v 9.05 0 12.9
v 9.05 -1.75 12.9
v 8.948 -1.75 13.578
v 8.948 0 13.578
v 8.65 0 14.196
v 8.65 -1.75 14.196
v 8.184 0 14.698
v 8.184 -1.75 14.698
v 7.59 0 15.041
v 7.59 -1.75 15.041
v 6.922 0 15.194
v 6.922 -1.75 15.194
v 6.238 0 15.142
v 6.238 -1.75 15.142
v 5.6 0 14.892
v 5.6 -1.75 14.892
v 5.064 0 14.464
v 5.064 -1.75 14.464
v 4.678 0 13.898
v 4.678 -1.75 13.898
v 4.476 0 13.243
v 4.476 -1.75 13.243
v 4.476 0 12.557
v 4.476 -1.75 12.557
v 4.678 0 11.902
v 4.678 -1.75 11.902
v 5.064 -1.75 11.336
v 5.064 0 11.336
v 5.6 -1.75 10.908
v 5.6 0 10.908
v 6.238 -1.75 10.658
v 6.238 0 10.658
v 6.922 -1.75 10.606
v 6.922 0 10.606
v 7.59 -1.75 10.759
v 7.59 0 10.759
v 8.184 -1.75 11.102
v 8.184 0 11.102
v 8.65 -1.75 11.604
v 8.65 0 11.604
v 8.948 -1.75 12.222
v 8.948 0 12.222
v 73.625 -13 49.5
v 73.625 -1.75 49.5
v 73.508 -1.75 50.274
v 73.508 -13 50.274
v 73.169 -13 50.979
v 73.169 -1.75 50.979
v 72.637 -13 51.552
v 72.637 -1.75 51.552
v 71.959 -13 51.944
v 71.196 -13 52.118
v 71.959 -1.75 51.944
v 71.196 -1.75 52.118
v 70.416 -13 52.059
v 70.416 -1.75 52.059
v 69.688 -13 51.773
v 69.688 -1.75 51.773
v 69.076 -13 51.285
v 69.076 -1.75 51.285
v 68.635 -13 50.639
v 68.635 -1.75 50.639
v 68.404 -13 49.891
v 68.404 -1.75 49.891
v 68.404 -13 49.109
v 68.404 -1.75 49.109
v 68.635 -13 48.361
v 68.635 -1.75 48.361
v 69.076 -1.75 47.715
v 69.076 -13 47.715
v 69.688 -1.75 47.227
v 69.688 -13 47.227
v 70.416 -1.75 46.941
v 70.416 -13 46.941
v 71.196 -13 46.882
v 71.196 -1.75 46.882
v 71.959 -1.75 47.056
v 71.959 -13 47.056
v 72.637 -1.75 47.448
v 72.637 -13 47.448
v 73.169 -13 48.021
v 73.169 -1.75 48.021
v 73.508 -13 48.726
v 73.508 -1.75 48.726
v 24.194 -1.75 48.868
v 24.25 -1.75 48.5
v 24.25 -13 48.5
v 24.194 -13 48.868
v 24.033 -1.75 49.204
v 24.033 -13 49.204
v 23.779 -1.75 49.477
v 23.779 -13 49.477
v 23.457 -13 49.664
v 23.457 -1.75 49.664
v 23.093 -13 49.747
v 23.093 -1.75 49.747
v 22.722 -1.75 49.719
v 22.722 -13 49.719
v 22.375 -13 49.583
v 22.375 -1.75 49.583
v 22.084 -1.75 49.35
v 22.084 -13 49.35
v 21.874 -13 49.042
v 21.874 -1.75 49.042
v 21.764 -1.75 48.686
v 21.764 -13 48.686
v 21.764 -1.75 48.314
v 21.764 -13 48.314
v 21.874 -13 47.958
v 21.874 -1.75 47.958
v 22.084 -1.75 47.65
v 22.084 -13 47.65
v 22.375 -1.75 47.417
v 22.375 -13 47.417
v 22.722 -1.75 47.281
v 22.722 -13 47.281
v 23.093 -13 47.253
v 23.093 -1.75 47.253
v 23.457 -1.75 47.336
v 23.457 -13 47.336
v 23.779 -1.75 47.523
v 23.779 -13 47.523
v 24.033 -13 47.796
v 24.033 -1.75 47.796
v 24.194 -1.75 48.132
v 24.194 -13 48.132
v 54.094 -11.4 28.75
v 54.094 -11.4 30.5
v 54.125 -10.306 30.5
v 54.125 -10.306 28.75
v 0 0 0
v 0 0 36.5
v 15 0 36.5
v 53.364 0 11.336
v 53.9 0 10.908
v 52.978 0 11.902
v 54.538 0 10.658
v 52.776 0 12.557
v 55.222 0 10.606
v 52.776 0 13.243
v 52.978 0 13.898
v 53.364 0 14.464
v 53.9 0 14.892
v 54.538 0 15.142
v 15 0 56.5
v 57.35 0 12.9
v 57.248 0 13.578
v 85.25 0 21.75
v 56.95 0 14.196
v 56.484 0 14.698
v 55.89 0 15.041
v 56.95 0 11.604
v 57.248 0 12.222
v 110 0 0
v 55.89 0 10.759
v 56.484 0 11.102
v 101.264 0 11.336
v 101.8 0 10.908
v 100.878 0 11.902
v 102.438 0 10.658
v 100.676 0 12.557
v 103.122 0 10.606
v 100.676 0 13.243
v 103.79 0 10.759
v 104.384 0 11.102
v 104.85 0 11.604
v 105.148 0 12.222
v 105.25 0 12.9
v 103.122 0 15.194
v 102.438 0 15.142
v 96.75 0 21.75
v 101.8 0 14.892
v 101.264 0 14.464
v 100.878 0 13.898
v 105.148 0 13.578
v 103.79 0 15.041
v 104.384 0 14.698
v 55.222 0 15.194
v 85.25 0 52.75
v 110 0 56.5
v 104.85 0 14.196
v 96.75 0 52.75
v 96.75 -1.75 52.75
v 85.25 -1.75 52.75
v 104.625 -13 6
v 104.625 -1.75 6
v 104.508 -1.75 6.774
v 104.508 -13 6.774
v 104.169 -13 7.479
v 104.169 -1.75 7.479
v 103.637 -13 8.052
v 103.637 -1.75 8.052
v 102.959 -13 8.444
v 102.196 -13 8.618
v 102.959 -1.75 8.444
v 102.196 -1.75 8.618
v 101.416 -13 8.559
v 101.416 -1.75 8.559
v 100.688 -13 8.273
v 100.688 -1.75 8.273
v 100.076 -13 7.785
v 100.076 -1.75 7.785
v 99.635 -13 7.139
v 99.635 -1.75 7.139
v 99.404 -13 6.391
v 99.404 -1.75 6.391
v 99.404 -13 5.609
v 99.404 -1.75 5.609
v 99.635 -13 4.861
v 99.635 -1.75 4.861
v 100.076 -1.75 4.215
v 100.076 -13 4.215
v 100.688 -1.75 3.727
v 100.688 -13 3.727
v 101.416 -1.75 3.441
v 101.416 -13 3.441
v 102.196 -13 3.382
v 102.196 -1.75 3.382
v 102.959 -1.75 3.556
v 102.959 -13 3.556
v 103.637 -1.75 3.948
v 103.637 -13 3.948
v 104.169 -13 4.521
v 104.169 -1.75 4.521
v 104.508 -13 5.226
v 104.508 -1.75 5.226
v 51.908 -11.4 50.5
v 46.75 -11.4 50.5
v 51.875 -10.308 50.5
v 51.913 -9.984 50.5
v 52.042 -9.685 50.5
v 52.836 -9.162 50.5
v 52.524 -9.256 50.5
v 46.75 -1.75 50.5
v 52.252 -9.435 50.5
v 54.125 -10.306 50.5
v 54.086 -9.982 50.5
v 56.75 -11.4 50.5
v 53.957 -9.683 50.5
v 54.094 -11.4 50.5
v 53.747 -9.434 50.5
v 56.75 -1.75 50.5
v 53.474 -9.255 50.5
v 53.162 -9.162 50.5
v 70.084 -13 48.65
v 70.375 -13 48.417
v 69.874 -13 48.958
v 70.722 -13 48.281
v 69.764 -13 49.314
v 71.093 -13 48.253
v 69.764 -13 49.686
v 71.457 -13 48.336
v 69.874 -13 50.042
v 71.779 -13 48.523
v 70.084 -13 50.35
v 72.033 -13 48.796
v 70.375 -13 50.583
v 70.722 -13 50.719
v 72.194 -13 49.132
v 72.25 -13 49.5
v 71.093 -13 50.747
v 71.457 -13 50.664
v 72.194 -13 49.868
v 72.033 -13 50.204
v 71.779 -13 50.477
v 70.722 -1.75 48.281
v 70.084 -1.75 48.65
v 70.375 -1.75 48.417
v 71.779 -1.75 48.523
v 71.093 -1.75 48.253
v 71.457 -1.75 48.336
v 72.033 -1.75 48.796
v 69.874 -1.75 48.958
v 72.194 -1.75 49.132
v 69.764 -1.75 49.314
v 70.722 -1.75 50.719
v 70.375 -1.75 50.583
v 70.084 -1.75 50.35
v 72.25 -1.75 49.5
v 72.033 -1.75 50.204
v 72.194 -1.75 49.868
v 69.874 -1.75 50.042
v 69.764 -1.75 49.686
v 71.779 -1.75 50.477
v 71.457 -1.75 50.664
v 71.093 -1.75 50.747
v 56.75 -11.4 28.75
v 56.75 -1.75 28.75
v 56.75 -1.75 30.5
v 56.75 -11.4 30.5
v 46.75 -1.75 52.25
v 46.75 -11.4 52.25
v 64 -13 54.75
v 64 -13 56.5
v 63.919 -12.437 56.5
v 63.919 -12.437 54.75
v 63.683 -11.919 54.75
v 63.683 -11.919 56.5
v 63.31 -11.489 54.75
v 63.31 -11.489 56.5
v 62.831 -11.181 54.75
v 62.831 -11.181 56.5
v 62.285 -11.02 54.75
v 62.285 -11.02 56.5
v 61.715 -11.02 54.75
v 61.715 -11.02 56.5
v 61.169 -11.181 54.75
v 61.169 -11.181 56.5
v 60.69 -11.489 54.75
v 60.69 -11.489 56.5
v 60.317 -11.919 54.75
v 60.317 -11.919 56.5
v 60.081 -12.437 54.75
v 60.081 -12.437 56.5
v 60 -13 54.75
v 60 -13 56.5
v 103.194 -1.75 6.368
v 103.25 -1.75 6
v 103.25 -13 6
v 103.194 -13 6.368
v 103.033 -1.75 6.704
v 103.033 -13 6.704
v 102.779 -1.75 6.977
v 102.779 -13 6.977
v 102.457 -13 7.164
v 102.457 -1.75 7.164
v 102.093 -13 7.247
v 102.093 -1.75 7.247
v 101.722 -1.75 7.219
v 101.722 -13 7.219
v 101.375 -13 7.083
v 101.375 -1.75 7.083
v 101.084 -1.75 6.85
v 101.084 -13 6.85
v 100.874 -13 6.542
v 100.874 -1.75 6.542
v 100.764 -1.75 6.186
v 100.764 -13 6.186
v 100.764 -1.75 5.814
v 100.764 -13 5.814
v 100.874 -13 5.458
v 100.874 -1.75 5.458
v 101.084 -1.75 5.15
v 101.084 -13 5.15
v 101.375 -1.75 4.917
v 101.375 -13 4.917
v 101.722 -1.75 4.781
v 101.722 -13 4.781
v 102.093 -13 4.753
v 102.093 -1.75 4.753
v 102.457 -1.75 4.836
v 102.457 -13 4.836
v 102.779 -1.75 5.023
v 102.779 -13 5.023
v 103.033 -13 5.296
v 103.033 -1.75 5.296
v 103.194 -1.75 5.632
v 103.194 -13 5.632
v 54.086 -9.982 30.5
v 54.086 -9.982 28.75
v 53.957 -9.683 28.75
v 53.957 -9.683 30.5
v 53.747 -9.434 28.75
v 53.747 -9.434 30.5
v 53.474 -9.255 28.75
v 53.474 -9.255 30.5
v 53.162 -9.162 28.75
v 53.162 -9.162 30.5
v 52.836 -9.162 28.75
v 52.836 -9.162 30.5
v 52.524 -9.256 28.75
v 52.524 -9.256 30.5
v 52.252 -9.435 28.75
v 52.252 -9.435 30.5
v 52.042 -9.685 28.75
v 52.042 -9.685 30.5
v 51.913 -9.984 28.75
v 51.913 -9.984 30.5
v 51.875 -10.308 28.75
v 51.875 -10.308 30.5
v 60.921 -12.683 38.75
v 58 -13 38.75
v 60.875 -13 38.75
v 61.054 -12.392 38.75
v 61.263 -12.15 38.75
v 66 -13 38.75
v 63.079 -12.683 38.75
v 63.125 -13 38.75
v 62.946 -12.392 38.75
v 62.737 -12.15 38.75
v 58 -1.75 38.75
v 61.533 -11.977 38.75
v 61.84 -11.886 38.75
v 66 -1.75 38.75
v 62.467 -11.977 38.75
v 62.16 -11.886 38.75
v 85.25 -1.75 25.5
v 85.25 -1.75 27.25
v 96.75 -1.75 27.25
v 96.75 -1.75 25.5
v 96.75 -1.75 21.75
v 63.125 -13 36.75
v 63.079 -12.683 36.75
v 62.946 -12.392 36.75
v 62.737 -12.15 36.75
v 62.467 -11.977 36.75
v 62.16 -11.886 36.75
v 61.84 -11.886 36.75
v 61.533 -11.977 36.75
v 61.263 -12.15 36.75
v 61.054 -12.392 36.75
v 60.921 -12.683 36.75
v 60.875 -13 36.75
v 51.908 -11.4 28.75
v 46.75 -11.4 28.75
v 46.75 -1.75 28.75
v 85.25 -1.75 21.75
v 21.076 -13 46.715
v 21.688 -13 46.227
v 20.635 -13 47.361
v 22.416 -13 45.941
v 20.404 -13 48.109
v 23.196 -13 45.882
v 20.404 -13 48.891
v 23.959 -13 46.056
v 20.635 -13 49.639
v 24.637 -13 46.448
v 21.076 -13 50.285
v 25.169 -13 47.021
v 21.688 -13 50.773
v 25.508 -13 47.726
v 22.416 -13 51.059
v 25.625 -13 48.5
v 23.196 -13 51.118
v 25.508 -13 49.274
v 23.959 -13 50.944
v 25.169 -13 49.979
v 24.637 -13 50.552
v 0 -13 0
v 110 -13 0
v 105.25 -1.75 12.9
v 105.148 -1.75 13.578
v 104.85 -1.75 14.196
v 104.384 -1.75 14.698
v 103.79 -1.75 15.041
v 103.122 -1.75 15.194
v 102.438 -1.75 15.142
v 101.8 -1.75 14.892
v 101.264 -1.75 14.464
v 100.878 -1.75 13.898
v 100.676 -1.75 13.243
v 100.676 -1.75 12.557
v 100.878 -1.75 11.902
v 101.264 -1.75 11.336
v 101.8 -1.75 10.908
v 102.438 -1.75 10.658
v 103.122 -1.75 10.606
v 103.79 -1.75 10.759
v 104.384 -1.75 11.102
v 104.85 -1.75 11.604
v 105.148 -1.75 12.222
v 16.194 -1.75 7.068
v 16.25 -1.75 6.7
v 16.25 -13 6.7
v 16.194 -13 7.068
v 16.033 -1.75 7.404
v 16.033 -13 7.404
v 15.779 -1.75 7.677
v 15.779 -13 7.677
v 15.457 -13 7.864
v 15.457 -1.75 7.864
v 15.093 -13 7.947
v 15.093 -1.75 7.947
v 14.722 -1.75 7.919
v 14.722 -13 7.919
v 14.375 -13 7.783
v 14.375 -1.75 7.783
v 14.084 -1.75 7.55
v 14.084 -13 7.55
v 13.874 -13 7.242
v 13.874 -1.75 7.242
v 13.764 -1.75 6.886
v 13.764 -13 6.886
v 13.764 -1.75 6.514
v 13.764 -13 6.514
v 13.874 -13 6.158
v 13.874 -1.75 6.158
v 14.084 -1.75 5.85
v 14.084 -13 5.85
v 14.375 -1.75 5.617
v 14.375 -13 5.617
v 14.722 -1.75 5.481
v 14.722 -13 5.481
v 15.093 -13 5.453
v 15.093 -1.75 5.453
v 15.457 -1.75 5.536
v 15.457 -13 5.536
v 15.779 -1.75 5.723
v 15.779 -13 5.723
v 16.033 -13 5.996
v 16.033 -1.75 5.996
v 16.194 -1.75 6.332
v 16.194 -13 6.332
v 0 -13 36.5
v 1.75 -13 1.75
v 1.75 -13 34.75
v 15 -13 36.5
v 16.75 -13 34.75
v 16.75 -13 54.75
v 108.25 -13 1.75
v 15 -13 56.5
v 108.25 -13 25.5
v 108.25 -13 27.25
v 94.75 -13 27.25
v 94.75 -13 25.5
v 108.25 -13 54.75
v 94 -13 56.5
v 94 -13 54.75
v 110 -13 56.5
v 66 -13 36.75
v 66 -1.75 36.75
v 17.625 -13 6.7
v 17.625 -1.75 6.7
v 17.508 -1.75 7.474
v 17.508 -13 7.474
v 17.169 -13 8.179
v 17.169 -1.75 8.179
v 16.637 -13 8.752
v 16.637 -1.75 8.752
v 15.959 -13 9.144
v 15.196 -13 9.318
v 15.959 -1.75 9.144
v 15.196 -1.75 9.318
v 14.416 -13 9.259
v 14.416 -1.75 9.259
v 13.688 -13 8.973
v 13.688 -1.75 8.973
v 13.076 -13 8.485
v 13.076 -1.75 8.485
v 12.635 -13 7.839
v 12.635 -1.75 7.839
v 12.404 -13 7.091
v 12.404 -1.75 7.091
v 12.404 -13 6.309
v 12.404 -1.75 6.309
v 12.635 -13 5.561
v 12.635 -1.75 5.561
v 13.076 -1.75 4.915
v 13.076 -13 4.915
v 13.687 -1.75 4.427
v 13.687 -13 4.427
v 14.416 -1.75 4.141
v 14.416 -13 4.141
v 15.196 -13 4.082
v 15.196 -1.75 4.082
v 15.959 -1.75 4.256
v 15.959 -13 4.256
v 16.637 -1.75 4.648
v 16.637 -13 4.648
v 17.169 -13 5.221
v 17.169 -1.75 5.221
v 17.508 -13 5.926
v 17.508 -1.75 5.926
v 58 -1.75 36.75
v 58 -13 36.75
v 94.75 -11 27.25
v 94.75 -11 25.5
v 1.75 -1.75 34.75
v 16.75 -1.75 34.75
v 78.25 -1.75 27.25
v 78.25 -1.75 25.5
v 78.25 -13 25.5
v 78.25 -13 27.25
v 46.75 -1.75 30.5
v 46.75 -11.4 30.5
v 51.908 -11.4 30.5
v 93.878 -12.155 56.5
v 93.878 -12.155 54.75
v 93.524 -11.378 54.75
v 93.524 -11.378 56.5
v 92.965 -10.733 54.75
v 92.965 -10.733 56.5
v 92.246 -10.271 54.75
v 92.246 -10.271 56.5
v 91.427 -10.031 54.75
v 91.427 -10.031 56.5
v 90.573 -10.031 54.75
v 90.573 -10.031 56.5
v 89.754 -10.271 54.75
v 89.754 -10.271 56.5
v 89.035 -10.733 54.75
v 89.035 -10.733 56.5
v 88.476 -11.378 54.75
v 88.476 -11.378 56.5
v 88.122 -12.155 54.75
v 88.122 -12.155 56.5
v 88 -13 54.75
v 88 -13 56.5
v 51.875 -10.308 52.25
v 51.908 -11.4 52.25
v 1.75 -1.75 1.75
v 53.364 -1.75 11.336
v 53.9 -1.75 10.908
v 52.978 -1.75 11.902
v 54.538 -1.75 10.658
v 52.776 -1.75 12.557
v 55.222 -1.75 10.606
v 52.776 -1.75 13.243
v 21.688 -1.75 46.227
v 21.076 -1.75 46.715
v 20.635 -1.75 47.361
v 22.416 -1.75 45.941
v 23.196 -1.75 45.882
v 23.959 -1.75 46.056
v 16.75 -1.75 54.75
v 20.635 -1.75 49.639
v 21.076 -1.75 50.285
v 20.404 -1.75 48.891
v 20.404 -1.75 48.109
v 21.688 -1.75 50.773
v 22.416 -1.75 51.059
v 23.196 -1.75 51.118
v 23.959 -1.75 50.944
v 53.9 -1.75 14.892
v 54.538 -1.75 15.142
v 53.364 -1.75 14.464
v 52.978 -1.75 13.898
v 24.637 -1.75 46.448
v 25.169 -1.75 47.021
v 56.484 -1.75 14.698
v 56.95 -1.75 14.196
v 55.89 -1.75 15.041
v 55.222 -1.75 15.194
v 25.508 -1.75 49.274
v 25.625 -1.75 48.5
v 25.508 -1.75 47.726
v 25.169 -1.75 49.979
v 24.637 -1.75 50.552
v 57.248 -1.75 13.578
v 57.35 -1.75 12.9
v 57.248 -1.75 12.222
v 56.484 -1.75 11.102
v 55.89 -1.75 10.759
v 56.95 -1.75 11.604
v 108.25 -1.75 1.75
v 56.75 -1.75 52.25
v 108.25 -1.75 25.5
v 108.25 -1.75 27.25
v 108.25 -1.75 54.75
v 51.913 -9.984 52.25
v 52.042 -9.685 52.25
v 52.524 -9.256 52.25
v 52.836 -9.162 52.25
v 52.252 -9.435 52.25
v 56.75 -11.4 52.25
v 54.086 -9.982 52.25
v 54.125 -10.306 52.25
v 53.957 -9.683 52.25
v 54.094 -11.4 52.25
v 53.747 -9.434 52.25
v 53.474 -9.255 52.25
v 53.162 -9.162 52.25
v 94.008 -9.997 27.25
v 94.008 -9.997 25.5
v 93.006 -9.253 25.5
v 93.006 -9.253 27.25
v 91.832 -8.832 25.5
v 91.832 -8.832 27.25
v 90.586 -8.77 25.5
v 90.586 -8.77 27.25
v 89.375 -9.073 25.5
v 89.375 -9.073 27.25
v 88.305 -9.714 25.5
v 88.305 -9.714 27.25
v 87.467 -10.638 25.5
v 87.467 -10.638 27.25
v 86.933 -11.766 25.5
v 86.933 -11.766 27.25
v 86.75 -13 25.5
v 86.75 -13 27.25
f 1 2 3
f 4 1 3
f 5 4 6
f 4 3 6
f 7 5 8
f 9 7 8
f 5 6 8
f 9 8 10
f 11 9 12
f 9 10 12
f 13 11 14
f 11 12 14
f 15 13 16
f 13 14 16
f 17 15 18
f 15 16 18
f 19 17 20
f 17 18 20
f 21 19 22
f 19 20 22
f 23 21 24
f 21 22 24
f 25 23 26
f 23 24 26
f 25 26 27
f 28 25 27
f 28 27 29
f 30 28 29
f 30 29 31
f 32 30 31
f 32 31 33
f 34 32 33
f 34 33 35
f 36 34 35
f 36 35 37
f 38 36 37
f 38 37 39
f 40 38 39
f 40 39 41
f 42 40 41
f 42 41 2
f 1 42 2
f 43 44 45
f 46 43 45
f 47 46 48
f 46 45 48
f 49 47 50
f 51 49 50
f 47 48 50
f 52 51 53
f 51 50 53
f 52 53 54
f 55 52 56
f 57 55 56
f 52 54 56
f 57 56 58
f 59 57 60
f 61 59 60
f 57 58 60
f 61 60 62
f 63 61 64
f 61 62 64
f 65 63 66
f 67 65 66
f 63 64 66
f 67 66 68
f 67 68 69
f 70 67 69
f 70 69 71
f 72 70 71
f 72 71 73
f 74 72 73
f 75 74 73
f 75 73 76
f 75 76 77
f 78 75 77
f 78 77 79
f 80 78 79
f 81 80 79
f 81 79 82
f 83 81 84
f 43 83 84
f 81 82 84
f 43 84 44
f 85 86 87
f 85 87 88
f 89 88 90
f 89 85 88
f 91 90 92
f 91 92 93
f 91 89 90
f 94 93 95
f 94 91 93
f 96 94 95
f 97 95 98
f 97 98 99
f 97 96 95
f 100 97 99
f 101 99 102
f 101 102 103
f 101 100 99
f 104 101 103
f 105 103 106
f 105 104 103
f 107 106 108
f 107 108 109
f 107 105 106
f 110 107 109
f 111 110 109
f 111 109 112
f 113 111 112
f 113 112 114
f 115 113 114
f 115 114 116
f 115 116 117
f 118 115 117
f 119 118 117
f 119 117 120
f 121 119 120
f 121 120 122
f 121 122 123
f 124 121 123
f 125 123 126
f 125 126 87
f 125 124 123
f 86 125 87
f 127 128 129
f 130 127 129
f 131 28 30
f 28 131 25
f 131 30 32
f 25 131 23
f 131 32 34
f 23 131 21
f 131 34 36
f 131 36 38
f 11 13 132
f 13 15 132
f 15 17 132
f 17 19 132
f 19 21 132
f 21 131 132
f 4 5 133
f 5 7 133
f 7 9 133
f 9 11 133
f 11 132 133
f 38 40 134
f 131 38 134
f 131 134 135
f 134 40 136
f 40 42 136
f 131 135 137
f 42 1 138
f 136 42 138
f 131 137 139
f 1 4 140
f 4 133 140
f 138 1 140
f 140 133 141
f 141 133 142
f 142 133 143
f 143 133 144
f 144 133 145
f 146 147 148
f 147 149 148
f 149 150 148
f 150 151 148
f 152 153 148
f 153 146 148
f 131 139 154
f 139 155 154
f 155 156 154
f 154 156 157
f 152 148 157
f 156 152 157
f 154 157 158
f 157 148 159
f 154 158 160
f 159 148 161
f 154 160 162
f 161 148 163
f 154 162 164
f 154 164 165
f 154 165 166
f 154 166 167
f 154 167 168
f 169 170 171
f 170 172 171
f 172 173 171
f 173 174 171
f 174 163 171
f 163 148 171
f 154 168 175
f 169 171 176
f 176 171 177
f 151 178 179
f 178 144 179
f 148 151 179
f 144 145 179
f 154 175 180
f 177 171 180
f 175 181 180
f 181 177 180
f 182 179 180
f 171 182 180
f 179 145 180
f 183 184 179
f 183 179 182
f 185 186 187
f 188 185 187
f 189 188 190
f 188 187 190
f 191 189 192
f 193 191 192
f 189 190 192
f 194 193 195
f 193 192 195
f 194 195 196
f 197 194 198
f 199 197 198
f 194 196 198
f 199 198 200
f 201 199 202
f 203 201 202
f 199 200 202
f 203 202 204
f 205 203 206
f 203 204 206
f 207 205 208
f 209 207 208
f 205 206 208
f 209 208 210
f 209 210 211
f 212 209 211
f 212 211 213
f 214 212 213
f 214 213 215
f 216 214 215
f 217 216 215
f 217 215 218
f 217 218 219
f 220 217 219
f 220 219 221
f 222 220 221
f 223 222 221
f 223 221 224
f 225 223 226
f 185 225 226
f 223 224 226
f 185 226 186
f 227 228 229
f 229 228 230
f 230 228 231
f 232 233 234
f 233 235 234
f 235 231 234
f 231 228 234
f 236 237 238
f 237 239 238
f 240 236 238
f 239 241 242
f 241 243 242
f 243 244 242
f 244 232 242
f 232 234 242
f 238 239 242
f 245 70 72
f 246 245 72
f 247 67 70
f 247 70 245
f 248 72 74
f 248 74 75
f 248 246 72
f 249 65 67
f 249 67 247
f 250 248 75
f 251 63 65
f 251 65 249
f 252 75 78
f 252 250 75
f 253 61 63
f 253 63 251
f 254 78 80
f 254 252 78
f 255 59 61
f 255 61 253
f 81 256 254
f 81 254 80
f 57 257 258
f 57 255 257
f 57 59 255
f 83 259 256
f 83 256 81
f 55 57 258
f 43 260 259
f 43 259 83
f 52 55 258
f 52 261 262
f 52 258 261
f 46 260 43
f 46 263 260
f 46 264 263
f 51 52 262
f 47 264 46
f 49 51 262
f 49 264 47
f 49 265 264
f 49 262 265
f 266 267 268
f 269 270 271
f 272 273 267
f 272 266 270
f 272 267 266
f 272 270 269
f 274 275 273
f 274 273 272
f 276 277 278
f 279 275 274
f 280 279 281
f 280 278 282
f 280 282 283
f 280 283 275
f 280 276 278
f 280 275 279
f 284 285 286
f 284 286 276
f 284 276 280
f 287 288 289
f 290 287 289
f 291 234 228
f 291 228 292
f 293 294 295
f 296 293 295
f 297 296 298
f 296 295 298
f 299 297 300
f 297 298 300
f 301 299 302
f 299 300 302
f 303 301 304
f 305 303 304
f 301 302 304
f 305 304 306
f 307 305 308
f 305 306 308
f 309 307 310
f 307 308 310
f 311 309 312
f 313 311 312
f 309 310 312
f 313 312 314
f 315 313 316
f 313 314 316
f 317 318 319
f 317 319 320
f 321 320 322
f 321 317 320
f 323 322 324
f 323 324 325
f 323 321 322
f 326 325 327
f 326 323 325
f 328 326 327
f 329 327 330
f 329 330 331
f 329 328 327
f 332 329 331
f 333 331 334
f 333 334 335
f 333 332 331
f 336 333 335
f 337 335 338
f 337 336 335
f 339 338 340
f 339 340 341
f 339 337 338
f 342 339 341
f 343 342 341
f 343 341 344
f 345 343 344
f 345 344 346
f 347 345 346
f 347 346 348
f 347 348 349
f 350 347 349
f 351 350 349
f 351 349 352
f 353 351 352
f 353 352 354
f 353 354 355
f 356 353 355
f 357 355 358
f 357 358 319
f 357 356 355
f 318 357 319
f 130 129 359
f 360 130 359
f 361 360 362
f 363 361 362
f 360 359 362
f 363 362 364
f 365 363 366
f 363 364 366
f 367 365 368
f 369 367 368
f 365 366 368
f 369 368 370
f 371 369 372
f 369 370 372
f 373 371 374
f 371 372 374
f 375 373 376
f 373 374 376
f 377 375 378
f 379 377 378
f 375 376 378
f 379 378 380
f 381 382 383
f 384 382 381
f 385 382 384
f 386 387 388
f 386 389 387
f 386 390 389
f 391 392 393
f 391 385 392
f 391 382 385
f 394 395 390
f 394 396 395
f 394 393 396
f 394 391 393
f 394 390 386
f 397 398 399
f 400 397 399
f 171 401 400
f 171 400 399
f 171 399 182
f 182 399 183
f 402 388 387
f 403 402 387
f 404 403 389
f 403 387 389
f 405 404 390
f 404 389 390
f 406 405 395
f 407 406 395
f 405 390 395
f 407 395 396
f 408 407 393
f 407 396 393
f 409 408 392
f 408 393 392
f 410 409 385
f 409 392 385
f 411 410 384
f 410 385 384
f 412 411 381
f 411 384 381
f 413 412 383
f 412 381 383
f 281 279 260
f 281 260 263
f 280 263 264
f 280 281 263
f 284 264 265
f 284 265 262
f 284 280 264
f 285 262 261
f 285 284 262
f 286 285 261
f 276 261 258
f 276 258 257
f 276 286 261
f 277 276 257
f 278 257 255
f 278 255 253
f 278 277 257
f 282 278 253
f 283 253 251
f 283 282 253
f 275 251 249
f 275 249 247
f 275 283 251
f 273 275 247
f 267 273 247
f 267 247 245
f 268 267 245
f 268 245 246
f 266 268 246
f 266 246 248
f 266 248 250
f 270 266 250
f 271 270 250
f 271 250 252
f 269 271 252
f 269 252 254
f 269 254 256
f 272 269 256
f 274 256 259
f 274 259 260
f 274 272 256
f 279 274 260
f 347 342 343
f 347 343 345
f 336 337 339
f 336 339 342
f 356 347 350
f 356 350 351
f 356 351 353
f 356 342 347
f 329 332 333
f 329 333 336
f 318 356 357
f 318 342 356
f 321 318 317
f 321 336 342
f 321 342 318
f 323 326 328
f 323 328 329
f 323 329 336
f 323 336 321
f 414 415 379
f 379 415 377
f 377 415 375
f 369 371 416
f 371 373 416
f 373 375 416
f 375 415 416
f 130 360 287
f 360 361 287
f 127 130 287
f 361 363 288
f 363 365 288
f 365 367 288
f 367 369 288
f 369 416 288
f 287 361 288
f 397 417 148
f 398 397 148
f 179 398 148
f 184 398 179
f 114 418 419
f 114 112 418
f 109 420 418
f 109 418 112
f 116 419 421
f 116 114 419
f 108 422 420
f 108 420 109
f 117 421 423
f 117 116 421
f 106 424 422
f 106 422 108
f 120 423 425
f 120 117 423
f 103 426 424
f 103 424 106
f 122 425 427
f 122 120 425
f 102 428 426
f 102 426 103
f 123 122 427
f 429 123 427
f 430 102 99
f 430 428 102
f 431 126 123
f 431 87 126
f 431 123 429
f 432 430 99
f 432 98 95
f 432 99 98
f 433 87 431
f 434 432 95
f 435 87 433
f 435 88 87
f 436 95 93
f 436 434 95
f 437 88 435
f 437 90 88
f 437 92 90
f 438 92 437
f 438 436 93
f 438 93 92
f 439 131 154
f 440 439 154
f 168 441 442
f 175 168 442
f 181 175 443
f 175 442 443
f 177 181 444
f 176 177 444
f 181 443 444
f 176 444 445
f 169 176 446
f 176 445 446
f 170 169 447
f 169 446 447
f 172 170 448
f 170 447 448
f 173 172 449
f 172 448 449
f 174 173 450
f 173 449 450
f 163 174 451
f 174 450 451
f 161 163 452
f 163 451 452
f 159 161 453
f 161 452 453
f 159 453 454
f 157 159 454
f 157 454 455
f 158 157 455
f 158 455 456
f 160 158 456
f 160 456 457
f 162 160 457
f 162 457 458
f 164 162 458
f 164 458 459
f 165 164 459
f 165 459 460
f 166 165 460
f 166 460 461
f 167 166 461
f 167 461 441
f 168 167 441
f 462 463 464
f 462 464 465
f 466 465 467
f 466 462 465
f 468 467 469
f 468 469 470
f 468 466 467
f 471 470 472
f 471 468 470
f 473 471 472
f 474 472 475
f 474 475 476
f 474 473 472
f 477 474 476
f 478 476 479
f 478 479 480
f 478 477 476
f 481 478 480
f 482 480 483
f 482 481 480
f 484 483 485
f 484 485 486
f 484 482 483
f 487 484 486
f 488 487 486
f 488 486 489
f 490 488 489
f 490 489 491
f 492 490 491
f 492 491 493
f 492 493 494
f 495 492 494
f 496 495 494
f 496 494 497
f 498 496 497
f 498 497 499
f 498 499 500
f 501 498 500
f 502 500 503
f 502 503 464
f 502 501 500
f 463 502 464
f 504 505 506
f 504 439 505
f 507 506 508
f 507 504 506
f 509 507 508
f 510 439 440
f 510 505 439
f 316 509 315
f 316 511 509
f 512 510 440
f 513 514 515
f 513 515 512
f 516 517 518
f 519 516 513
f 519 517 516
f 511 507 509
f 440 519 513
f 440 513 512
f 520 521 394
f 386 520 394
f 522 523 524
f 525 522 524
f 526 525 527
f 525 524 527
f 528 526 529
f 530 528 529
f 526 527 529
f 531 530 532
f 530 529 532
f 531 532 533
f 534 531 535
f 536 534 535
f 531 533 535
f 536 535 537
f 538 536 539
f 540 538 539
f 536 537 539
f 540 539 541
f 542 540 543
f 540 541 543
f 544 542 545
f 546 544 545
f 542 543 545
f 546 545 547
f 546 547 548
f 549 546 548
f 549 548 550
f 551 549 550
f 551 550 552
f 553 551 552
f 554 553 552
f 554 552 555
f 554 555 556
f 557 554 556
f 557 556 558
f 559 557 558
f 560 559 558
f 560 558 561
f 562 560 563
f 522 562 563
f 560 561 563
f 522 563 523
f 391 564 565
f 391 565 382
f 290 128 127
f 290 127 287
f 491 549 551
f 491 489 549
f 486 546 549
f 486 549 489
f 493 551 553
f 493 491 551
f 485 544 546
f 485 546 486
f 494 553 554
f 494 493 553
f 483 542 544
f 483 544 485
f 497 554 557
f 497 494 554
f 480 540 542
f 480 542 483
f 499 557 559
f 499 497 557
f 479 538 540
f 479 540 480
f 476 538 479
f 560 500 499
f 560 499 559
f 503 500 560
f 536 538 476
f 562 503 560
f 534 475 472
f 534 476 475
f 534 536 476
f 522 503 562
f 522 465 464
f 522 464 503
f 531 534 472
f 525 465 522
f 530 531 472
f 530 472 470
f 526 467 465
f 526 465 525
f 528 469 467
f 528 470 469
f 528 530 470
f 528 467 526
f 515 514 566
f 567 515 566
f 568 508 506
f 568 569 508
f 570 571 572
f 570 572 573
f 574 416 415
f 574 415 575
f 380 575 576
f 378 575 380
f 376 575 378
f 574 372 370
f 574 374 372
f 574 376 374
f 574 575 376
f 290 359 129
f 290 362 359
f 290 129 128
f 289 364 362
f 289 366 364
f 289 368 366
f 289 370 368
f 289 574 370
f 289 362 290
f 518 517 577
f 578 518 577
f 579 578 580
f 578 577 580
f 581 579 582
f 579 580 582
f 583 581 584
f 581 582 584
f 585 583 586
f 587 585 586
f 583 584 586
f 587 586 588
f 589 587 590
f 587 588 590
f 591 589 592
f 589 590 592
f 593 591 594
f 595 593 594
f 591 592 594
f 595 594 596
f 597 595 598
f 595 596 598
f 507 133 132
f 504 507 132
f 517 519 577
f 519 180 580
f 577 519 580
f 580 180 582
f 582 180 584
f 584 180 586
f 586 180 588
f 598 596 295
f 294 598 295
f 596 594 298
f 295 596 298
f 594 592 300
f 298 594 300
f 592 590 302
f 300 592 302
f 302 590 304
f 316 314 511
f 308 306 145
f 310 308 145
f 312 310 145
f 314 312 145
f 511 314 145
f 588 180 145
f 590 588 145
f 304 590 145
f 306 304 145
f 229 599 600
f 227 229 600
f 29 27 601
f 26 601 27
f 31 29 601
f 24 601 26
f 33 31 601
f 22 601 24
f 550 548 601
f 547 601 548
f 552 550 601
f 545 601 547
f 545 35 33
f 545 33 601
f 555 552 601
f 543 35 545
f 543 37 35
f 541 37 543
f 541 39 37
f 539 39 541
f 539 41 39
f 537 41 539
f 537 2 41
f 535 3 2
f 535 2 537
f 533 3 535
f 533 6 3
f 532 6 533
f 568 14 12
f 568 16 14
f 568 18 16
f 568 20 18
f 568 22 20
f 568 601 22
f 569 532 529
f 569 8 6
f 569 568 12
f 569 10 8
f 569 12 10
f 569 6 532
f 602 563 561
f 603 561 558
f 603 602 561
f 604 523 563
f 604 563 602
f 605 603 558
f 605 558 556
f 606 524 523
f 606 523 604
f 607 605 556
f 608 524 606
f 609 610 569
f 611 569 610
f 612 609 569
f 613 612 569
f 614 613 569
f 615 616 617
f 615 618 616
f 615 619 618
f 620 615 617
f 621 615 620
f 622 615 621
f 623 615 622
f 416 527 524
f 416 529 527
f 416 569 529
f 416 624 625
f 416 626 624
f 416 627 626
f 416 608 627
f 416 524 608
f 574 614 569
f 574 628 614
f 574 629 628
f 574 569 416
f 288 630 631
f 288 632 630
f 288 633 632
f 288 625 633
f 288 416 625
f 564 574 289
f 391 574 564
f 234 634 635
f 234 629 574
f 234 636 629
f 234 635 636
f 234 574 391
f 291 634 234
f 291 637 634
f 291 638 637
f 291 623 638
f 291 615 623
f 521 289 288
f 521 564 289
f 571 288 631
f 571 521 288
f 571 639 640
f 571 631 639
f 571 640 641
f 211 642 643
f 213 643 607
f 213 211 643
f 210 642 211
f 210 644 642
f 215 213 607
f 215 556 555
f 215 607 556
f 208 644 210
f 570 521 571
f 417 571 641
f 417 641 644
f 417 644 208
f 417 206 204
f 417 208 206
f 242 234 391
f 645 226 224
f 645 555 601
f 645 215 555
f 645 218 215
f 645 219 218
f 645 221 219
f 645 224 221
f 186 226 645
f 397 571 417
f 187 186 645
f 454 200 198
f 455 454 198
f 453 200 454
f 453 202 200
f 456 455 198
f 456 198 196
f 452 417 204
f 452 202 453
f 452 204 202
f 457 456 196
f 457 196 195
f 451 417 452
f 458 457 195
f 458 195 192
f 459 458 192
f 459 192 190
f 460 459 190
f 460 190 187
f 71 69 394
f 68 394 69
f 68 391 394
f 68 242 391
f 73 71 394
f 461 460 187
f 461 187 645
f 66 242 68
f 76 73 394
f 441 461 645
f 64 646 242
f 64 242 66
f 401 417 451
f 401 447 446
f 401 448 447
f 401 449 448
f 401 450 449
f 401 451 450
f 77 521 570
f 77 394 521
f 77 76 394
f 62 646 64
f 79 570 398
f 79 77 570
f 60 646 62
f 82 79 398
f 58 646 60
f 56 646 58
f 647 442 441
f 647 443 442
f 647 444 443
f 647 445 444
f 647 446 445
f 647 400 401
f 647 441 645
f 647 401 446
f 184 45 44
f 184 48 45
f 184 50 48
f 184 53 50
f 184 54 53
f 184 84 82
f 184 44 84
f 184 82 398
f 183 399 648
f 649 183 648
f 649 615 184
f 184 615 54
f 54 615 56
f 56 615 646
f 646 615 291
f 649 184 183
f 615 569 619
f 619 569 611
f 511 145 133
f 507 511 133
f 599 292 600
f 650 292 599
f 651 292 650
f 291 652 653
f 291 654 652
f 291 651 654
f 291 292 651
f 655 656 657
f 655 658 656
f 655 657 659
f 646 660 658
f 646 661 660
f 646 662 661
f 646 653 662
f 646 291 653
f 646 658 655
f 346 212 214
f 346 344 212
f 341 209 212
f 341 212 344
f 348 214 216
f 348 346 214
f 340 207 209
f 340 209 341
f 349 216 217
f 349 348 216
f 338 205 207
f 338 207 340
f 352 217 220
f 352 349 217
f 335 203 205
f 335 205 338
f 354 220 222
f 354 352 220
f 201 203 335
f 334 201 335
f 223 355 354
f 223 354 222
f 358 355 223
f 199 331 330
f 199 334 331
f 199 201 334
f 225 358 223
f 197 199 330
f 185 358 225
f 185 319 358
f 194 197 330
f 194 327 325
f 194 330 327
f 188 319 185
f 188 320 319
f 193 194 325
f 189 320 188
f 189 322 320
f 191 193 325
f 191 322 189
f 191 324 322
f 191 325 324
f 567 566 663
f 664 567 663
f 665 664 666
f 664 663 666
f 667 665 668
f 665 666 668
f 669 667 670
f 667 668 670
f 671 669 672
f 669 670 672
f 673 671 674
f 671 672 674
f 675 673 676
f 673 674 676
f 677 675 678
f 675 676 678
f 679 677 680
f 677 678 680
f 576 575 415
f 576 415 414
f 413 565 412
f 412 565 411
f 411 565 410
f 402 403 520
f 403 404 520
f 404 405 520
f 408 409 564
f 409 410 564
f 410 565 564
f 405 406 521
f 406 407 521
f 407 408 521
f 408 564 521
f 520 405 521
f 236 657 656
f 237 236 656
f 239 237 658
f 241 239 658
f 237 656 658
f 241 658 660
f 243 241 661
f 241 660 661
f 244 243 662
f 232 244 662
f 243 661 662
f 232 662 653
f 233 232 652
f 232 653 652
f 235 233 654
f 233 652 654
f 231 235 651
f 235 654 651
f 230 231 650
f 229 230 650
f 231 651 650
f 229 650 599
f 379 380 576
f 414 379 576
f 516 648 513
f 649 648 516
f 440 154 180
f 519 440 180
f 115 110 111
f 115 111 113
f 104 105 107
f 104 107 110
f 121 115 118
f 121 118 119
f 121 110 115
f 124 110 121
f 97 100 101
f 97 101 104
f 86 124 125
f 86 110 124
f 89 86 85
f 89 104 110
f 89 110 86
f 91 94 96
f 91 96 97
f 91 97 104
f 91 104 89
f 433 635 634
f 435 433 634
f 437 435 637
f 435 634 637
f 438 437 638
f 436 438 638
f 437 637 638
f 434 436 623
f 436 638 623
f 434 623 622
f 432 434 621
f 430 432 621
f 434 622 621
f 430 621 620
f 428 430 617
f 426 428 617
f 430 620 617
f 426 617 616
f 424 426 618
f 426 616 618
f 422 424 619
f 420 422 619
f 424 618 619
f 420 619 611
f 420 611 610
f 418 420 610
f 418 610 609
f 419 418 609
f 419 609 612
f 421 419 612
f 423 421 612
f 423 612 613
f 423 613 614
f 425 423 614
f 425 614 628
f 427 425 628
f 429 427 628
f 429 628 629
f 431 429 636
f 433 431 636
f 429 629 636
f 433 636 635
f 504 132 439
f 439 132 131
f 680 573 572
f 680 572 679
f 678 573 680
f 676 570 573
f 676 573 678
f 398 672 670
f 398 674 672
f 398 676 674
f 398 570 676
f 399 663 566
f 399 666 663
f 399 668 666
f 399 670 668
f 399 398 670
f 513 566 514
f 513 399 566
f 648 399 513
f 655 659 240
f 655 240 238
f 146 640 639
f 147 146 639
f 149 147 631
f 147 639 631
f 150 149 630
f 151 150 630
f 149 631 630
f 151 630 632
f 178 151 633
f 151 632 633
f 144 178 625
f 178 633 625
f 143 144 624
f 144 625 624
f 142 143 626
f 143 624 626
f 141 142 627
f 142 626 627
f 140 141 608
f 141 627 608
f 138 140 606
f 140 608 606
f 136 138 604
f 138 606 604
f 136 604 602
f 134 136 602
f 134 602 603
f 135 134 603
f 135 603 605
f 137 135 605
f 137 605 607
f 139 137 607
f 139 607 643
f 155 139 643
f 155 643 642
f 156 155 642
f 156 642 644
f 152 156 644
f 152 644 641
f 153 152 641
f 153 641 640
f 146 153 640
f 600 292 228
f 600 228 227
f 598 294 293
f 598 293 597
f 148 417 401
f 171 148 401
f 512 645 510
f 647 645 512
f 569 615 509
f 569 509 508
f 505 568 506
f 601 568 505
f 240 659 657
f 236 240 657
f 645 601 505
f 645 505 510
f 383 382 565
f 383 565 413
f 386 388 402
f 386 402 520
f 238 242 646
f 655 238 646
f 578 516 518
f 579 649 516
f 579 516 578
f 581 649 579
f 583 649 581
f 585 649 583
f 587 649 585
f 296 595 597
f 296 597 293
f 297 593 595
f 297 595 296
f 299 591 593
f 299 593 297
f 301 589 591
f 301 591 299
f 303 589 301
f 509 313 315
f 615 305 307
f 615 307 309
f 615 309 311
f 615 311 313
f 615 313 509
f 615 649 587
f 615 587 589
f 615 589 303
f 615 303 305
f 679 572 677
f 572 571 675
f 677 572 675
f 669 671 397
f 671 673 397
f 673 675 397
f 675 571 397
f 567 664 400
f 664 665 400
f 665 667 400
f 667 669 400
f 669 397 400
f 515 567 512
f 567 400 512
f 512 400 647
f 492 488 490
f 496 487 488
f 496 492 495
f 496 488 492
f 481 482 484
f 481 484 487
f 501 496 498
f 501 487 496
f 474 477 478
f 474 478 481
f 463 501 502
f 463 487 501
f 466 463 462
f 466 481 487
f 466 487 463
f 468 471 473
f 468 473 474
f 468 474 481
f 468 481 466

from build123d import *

# Parameters (mm, degrees)
F1_DEPTH  = 13
F2_T      = -1.75
F3_R      = 2.625
F3_R_2    = 1.25
F3_W      = 30
F3_H      = 1.75
F3_W_2    = 8
F3_H_2    = 2
F4_DEPTH  = 11.25
F5_R      = 3
F5_R_2    = 2
F6_DEPTH  = 2
F7_R      = 1.125
F8_DEPTH  = 2
F10_DEPTH = 2
F11_W     = 10
F11_H     = 1.75
F12_DEPTH = 11.25
F13_W     = 10
F13_H     = 1.75
F14_DEPTH = 1.6
F16_DEPTH = 25
F17_W     = 11.5
F17_H     = 31
F18_DEPTH = 1.751
F19_R     = 2.3
F20_DEPTH = 1.751


with BuildPart() as f1:
    # F0 (on Front) → F1 (new body)
    with BuildSketch(Plane.XZ):
        Polygon((0, 36.5), (0, 0), (110, 0), (110, 56.5), (15, 56.5), (15, 36.5), align=None)
    extrude(amount=F1_DEPTH)

    # F2
    f2_openings = [f1.faces().sort_by_distance(p)[0] for p in [
        (57.409129, -13, 27.324387),
    ]]
    offset(amount=F2_T, openings=f2_openings, kind=Kind.INTERSECTION)

    # F3 (on face) → F4 (join, through all)
    with BuildSketch(Plane.XZ.offset(1.75)):
        with Locations((23, 48.5)):
            Circle(F3_R)
        with Locations((23, 48.5)):
            Circle(F3_R_2, mode=Mode.SUBTRACT)
        with Locations((15, 6.7)):
            Circle(F3_R)
        with Locations((15, 6.7)):
            Circle(F3_R_2, mode=Mode.SUBTRACT)
        with Locations((71, 49.5)):
            Circle(F3_R)
        with Locations((71, 49.5)):
            Circle(F3_R_2, mode=Mode.SUBTRACT)
        with Locations((102, 6)):
            Circle(F3_R)
        with Locations((102, 6)):
            Circle(F3_R_2, mode=Mode.SUBTRACT)
        with Locations((93.25, 26.375)):
            Rectangle(F3_W, F3_H)
        with Locations((62, 37.75)):
            Rectangle(F3_W_2, F3_H_2)
    extrude(amount=F4_DEPTH)

    # F5 (on face) → F6 (cut)
    with BuildSketch(Plane.XY.offset(56.5)):
        with Locations((91, -13)):
            Circle(F5_R)
        with Locations((62, -13)):
            Circle(F5_R_2)
    extrude(amount=-F6_DEPTH, mode=Mode.SUBTRACT)

    # F7 (on face) → F8 (cut)
    with BuildSketch(Plane.XY.offset(38.75)):
        with Locations((62, -13)):
            Circle(F7_R)
    extrude(amount=-F8_DEPTH, mode=Mode.SUBTRACT)

    # F9 (on face) → F10 (cut)
    with BuildSketch(Plane.XY.offset(27.25)):
        with BuildLine():
            Line((94.75, -15), (94.75, -11))
            ThreePointArc((94.75, -11), (86.75, -13), (94.75, -15))
        make_face()
    extrude(amount=-F10_DEPTH, mode=Mode.SUBTRACT)

    # F11 (on face) → F12 (join, through all)
    with BuildSketch(Plane.XZ.offset(1.75)):
        with Locations((51.75, 51.375)):
            Rectangle(F11_W, F11_H)
        with Locations((51.75, 29.625)):
            Rectangle(F11_W, F11_H)
    extrude(amount=F12_DEPTH)

    # F13 (on face) → F14 (cut)
    with BuildSketch(Plane.XZ.offset(13)):
        with Locations((51.75, 51.375)):
            Rectangle(F13_W, F13_H)
        with Locations((51.75, 29.625)):
            Rectangle(F13_W, F13_H)
    extrude(amount=-F14_DEPTH, mode=Mode.SUBTRACT)

    # F15 (on face) → F16 (cut)
    with BuildSketch(Plane.XY.offset(52.25)):
        with BuildLine():
            Line((54.094339151, -11.4), (54.1245706409, -10.3060785062))
            ThreePointArc((54.1245706409, -10.3060785062), (52.9989978467, -9.1500004463), (51.8754865135, -10.3080819977))
            Line((51.8754865135, -10.3080819977), (51.9076095865, -11.4))
            Line((51.9076095865, -11.4), (54.094339151, -11.4))
        make_face()
    extrude(amount=-F16_DEPTH, mode=Mode.SUBTRACT)

    # F17 (on face) → F18 (cut, through all)
    with BuildSketch(Plane.XZ.offset(1.75)):
        with Locations((91, 37.25)):
            Rectangle(F17_W, F17_H)
    extrude(amount=-F18_DEPTH, mode=Mode.SUBTRACT)

    # F19 (on face) → F20 (cut, through all)
    with BuildSketch(Plane.XZ.offset(1.75)):
        with Locations((6.75, 12.9)):
            Circle(F19_R)
        with Locations((55.05, 12.9)):
            Circle(F19_R)
        with Locations((102.95, 12.9)):
            Circle(F19_R)
    extrude(amount=-F20_DEPTH, mode=Mode.SUBTRACT)


solid = f1.part
